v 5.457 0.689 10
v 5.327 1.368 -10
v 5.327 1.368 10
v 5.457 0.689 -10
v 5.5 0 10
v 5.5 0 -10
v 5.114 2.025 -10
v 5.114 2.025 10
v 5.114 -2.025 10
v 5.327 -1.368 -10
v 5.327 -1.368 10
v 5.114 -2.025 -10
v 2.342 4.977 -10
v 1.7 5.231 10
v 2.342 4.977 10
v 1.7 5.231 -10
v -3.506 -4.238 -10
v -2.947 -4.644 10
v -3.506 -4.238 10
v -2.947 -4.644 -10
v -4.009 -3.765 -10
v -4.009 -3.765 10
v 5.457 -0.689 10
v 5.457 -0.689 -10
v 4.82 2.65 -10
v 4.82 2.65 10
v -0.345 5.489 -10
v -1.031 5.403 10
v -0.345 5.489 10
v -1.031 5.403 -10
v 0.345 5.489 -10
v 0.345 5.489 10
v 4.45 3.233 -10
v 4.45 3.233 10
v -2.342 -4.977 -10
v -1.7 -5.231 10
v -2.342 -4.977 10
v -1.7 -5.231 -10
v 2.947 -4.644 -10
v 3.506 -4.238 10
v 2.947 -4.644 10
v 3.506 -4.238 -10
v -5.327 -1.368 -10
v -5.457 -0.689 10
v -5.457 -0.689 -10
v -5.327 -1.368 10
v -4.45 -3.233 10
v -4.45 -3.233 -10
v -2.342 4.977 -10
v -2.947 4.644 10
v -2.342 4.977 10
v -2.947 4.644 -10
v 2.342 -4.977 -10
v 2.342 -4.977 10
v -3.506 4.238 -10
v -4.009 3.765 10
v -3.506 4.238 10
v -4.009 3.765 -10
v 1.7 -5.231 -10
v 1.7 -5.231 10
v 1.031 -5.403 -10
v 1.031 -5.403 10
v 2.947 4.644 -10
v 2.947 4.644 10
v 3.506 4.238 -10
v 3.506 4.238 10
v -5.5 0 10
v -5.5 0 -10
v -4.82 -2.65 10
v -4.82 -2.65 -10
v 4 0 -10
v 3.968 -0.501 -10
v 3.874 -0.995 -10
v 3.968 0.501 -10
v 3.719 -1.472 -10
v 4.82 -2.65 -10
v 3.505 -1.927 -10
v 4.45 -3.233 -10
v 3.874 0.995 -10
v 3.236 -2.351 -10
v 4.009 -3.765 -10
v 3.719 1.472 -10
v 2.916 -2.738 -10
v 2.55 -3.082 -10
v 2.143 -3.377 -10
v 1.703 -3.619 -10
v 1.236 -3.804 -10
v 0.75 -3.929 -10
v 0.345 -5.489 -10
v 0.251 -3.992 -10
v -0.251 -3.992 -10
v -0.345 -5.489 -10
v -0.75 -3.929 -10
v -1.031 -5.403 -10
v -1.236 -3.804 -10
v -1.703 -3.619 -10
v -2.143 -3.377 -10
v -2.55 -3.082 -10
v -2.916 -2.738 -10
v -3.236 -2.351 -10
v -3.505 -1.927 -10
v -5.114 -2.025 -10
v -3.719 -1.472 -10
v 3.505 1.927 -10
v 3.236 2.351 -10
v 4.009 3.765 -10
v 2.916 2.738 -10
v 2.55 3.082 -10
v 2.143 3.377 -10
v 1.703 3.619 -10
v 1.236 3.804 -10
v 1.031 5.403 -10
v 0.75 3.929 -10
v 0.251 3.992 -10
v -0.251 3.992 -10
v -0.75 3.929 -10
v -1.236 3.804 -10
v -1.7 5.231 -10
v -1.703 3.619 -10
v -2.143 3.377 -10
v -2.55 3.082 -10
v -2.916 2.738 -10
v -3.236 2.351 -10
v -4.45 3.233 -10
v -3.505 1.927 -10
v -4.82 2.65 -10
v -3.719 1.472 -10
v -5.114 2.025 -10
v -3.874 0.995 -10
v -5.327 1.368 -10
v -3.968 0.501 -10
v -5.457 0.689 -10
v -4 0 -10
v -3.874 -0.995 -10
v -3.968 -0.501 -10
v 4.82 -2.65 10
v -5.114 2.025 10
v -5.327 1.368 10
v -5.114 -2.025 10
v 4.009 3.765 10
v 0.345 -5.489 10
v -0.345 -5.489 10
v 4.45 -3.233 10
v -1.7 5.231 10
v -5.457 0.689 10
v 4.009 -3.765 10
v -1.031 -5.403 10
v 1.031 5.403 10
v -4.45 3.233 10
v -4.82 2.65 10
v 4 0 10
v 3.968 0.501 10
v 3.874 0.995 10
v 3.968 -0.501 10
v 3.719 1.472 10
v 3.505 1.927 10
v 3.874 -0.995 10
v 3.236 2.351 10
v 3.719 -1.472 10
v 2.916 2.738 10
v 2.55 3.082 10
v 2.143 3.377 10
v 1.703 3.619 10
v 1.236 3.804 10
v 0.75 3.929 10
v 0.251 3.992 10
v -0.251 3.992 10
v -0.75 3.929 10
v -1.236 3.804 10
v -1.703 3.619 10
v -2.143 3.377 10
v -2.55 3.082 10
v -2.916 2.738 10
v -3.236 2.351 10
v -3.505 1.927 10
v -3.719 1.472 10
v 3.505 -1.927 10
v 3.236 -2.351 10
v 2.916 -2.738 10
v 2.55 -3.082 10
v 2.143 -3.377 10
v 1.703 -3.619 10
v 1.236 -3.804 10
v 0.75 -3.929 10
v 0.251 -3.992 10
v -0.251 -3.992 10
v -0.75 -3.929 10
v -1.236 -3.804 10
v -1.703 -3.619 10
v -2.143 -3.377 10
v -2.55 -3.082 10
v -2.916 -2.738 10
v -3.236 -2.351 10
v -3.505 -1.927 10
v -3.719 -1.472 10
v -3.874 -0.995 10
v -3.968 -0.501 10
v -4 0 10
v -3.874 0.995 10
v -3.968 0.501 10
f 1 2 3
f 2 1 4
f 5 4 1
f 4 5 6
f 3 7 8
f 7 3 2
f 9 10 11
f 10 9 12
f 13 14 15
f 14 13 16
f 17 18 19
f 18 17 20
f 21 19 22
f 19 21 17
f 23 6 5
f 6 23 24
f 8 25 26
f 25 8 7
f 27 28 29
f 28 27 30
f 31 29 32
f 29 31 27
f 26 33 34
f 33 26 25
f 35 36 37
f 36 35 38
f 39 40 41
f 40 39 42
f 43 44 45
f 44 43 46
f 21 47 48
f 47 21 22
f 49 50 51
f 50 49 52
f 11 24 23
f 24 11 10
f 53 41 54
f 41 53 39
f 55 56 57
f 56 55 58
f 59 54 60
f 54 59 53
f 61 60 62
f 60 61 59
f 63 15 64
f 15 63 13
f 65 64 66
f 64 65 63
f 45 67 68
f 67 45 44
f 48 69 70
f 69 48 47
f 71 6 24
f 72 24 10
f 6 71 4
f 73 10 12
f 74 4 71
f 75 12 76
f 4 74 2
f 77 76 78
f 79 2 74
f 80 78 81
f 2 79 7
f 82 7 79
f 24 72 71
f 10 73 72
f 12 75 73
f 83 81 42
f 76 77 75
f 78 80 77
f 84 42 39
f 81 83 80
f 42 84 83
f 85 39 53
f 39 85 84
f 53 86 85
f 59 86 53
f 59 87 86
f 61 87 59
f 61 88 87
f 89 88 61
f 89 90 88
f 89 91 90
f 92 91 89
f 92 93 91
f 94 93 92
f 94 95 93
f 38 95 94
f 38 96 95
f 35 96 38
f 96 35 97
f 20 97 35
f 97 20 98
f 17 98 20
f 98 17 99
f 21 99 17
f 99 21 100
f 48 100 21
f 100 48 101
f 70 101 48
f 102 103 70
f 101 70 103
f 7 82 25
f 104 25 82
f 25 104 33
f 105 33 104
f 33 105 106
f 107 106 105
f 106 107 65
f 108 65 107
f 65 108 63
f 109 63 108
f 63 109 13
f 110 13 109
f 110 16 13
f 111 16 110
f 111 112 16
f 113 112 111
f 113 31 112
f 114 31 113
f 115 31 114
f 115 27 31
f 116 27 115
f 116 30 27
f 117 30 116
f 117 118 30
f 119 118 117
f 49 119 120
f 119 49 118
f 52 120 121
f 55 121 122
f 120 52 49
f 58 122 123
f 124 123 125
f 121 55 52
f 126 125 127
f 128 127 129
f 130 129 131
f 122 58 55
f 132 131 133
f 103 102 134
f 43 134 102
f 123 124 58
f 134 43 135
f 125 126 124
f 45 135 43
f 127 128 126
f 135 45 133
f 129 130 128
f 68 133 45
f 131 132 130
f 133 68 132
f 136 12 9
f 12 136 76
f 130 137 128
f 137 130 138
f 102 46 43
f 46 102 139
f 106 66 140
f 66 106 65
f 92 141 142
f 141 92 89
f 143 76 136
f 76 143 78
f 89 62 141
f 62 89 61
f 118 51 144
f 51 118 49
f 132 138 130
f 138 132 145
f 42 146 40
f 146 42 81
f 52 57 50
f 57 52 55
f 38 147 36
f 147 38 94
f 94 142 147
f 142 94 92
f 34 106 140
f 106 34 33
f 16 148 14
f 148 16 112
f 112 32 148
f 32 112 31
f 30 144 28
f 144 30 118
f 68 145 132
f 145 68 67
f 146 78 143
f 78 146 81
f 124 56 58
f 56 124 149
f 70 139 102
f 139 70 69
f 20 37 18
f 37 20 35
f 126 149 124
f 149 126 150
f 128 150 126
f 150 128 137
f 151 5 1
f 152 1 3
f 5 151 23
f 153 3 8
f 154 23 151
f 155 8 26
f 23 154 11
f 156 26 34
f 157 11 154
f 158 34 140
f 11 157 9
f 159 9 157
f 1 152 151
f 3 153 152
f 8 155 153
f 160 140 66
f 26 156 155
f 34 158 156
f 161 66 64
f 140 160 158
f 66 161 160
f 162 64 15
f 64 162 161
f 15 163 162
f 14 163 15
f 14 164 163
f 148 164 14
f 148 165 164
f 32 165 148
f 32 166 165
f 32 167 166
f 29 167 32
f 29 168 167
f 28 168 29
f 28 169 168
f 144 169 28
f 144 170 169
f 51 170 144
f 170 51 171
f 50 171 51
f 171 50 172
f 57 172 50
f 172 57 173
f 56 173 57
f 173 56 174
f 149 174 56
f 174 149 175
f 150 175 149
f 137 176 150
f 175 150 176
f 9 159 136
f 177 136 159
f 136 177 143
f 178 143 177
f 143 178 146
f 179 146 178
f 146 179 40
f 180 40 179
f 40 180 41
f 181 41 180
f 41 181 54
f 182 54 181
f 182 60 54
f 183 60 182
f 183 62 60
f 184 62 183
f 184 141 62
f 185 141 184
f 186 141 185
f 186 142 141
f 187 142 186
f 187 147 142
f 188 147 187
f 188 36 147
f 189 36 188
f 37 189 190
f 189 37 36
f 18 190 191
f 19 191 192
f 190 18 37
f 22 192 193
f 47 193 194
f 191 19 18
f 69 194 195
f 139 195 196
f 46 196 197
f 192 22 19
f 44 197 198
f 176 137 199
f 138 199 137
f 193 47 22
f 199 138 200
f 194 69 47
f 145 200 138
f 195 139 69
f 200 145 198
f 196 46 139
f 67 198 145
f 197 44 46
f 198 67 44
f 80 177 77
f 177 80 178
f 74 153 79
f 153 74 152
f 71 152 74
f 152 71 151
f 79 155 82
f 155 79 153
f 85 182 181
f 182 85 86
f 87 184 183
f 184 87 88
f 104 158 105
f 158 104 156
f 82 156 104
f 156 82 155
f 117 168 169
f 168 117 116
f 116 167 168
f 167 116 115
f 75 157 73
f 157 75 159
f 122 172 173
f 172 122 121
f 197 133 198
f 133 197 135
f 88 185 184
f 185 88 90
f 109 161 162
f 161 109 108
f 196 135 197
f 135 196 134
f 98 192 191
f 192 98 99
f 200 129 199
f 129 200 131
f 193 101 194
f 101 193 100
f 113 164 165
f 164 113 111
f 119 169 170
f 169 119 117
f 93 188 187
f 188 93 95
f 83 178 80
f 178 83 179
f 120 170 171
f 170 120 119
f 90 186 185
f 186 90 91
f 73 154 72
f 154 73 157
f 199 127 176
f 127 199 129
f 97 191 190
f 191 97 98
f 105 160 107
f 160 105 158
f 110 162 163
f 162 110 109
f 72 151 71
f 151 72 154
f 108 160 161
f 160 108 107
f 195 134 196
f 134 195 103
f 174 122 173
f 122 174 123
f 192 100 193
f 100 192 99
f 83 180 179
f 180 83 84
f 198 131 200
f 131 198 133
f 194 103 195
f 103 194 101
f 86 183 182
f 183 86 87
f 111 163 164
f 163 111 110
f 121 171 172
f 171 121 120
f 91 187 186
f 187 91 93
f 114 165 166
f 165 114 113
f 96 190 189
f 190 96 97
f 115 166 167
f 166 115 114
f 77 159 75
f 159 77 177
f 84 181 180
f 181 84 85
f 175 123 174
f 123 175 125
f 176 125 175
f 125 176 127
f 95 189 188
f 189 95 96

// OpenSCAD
$fn = 50;


difference() {
	union() {
		translate(v = [0, 0, -10.0000000000]) {
			cylinder(h = 20, r = 5.5000000000);
		}
	}
	union() {
		translate(v = [0, 0, -100.0000000000]) {
			cylinder(h = 200, r = 4.0000000000);
		}
	}
}
